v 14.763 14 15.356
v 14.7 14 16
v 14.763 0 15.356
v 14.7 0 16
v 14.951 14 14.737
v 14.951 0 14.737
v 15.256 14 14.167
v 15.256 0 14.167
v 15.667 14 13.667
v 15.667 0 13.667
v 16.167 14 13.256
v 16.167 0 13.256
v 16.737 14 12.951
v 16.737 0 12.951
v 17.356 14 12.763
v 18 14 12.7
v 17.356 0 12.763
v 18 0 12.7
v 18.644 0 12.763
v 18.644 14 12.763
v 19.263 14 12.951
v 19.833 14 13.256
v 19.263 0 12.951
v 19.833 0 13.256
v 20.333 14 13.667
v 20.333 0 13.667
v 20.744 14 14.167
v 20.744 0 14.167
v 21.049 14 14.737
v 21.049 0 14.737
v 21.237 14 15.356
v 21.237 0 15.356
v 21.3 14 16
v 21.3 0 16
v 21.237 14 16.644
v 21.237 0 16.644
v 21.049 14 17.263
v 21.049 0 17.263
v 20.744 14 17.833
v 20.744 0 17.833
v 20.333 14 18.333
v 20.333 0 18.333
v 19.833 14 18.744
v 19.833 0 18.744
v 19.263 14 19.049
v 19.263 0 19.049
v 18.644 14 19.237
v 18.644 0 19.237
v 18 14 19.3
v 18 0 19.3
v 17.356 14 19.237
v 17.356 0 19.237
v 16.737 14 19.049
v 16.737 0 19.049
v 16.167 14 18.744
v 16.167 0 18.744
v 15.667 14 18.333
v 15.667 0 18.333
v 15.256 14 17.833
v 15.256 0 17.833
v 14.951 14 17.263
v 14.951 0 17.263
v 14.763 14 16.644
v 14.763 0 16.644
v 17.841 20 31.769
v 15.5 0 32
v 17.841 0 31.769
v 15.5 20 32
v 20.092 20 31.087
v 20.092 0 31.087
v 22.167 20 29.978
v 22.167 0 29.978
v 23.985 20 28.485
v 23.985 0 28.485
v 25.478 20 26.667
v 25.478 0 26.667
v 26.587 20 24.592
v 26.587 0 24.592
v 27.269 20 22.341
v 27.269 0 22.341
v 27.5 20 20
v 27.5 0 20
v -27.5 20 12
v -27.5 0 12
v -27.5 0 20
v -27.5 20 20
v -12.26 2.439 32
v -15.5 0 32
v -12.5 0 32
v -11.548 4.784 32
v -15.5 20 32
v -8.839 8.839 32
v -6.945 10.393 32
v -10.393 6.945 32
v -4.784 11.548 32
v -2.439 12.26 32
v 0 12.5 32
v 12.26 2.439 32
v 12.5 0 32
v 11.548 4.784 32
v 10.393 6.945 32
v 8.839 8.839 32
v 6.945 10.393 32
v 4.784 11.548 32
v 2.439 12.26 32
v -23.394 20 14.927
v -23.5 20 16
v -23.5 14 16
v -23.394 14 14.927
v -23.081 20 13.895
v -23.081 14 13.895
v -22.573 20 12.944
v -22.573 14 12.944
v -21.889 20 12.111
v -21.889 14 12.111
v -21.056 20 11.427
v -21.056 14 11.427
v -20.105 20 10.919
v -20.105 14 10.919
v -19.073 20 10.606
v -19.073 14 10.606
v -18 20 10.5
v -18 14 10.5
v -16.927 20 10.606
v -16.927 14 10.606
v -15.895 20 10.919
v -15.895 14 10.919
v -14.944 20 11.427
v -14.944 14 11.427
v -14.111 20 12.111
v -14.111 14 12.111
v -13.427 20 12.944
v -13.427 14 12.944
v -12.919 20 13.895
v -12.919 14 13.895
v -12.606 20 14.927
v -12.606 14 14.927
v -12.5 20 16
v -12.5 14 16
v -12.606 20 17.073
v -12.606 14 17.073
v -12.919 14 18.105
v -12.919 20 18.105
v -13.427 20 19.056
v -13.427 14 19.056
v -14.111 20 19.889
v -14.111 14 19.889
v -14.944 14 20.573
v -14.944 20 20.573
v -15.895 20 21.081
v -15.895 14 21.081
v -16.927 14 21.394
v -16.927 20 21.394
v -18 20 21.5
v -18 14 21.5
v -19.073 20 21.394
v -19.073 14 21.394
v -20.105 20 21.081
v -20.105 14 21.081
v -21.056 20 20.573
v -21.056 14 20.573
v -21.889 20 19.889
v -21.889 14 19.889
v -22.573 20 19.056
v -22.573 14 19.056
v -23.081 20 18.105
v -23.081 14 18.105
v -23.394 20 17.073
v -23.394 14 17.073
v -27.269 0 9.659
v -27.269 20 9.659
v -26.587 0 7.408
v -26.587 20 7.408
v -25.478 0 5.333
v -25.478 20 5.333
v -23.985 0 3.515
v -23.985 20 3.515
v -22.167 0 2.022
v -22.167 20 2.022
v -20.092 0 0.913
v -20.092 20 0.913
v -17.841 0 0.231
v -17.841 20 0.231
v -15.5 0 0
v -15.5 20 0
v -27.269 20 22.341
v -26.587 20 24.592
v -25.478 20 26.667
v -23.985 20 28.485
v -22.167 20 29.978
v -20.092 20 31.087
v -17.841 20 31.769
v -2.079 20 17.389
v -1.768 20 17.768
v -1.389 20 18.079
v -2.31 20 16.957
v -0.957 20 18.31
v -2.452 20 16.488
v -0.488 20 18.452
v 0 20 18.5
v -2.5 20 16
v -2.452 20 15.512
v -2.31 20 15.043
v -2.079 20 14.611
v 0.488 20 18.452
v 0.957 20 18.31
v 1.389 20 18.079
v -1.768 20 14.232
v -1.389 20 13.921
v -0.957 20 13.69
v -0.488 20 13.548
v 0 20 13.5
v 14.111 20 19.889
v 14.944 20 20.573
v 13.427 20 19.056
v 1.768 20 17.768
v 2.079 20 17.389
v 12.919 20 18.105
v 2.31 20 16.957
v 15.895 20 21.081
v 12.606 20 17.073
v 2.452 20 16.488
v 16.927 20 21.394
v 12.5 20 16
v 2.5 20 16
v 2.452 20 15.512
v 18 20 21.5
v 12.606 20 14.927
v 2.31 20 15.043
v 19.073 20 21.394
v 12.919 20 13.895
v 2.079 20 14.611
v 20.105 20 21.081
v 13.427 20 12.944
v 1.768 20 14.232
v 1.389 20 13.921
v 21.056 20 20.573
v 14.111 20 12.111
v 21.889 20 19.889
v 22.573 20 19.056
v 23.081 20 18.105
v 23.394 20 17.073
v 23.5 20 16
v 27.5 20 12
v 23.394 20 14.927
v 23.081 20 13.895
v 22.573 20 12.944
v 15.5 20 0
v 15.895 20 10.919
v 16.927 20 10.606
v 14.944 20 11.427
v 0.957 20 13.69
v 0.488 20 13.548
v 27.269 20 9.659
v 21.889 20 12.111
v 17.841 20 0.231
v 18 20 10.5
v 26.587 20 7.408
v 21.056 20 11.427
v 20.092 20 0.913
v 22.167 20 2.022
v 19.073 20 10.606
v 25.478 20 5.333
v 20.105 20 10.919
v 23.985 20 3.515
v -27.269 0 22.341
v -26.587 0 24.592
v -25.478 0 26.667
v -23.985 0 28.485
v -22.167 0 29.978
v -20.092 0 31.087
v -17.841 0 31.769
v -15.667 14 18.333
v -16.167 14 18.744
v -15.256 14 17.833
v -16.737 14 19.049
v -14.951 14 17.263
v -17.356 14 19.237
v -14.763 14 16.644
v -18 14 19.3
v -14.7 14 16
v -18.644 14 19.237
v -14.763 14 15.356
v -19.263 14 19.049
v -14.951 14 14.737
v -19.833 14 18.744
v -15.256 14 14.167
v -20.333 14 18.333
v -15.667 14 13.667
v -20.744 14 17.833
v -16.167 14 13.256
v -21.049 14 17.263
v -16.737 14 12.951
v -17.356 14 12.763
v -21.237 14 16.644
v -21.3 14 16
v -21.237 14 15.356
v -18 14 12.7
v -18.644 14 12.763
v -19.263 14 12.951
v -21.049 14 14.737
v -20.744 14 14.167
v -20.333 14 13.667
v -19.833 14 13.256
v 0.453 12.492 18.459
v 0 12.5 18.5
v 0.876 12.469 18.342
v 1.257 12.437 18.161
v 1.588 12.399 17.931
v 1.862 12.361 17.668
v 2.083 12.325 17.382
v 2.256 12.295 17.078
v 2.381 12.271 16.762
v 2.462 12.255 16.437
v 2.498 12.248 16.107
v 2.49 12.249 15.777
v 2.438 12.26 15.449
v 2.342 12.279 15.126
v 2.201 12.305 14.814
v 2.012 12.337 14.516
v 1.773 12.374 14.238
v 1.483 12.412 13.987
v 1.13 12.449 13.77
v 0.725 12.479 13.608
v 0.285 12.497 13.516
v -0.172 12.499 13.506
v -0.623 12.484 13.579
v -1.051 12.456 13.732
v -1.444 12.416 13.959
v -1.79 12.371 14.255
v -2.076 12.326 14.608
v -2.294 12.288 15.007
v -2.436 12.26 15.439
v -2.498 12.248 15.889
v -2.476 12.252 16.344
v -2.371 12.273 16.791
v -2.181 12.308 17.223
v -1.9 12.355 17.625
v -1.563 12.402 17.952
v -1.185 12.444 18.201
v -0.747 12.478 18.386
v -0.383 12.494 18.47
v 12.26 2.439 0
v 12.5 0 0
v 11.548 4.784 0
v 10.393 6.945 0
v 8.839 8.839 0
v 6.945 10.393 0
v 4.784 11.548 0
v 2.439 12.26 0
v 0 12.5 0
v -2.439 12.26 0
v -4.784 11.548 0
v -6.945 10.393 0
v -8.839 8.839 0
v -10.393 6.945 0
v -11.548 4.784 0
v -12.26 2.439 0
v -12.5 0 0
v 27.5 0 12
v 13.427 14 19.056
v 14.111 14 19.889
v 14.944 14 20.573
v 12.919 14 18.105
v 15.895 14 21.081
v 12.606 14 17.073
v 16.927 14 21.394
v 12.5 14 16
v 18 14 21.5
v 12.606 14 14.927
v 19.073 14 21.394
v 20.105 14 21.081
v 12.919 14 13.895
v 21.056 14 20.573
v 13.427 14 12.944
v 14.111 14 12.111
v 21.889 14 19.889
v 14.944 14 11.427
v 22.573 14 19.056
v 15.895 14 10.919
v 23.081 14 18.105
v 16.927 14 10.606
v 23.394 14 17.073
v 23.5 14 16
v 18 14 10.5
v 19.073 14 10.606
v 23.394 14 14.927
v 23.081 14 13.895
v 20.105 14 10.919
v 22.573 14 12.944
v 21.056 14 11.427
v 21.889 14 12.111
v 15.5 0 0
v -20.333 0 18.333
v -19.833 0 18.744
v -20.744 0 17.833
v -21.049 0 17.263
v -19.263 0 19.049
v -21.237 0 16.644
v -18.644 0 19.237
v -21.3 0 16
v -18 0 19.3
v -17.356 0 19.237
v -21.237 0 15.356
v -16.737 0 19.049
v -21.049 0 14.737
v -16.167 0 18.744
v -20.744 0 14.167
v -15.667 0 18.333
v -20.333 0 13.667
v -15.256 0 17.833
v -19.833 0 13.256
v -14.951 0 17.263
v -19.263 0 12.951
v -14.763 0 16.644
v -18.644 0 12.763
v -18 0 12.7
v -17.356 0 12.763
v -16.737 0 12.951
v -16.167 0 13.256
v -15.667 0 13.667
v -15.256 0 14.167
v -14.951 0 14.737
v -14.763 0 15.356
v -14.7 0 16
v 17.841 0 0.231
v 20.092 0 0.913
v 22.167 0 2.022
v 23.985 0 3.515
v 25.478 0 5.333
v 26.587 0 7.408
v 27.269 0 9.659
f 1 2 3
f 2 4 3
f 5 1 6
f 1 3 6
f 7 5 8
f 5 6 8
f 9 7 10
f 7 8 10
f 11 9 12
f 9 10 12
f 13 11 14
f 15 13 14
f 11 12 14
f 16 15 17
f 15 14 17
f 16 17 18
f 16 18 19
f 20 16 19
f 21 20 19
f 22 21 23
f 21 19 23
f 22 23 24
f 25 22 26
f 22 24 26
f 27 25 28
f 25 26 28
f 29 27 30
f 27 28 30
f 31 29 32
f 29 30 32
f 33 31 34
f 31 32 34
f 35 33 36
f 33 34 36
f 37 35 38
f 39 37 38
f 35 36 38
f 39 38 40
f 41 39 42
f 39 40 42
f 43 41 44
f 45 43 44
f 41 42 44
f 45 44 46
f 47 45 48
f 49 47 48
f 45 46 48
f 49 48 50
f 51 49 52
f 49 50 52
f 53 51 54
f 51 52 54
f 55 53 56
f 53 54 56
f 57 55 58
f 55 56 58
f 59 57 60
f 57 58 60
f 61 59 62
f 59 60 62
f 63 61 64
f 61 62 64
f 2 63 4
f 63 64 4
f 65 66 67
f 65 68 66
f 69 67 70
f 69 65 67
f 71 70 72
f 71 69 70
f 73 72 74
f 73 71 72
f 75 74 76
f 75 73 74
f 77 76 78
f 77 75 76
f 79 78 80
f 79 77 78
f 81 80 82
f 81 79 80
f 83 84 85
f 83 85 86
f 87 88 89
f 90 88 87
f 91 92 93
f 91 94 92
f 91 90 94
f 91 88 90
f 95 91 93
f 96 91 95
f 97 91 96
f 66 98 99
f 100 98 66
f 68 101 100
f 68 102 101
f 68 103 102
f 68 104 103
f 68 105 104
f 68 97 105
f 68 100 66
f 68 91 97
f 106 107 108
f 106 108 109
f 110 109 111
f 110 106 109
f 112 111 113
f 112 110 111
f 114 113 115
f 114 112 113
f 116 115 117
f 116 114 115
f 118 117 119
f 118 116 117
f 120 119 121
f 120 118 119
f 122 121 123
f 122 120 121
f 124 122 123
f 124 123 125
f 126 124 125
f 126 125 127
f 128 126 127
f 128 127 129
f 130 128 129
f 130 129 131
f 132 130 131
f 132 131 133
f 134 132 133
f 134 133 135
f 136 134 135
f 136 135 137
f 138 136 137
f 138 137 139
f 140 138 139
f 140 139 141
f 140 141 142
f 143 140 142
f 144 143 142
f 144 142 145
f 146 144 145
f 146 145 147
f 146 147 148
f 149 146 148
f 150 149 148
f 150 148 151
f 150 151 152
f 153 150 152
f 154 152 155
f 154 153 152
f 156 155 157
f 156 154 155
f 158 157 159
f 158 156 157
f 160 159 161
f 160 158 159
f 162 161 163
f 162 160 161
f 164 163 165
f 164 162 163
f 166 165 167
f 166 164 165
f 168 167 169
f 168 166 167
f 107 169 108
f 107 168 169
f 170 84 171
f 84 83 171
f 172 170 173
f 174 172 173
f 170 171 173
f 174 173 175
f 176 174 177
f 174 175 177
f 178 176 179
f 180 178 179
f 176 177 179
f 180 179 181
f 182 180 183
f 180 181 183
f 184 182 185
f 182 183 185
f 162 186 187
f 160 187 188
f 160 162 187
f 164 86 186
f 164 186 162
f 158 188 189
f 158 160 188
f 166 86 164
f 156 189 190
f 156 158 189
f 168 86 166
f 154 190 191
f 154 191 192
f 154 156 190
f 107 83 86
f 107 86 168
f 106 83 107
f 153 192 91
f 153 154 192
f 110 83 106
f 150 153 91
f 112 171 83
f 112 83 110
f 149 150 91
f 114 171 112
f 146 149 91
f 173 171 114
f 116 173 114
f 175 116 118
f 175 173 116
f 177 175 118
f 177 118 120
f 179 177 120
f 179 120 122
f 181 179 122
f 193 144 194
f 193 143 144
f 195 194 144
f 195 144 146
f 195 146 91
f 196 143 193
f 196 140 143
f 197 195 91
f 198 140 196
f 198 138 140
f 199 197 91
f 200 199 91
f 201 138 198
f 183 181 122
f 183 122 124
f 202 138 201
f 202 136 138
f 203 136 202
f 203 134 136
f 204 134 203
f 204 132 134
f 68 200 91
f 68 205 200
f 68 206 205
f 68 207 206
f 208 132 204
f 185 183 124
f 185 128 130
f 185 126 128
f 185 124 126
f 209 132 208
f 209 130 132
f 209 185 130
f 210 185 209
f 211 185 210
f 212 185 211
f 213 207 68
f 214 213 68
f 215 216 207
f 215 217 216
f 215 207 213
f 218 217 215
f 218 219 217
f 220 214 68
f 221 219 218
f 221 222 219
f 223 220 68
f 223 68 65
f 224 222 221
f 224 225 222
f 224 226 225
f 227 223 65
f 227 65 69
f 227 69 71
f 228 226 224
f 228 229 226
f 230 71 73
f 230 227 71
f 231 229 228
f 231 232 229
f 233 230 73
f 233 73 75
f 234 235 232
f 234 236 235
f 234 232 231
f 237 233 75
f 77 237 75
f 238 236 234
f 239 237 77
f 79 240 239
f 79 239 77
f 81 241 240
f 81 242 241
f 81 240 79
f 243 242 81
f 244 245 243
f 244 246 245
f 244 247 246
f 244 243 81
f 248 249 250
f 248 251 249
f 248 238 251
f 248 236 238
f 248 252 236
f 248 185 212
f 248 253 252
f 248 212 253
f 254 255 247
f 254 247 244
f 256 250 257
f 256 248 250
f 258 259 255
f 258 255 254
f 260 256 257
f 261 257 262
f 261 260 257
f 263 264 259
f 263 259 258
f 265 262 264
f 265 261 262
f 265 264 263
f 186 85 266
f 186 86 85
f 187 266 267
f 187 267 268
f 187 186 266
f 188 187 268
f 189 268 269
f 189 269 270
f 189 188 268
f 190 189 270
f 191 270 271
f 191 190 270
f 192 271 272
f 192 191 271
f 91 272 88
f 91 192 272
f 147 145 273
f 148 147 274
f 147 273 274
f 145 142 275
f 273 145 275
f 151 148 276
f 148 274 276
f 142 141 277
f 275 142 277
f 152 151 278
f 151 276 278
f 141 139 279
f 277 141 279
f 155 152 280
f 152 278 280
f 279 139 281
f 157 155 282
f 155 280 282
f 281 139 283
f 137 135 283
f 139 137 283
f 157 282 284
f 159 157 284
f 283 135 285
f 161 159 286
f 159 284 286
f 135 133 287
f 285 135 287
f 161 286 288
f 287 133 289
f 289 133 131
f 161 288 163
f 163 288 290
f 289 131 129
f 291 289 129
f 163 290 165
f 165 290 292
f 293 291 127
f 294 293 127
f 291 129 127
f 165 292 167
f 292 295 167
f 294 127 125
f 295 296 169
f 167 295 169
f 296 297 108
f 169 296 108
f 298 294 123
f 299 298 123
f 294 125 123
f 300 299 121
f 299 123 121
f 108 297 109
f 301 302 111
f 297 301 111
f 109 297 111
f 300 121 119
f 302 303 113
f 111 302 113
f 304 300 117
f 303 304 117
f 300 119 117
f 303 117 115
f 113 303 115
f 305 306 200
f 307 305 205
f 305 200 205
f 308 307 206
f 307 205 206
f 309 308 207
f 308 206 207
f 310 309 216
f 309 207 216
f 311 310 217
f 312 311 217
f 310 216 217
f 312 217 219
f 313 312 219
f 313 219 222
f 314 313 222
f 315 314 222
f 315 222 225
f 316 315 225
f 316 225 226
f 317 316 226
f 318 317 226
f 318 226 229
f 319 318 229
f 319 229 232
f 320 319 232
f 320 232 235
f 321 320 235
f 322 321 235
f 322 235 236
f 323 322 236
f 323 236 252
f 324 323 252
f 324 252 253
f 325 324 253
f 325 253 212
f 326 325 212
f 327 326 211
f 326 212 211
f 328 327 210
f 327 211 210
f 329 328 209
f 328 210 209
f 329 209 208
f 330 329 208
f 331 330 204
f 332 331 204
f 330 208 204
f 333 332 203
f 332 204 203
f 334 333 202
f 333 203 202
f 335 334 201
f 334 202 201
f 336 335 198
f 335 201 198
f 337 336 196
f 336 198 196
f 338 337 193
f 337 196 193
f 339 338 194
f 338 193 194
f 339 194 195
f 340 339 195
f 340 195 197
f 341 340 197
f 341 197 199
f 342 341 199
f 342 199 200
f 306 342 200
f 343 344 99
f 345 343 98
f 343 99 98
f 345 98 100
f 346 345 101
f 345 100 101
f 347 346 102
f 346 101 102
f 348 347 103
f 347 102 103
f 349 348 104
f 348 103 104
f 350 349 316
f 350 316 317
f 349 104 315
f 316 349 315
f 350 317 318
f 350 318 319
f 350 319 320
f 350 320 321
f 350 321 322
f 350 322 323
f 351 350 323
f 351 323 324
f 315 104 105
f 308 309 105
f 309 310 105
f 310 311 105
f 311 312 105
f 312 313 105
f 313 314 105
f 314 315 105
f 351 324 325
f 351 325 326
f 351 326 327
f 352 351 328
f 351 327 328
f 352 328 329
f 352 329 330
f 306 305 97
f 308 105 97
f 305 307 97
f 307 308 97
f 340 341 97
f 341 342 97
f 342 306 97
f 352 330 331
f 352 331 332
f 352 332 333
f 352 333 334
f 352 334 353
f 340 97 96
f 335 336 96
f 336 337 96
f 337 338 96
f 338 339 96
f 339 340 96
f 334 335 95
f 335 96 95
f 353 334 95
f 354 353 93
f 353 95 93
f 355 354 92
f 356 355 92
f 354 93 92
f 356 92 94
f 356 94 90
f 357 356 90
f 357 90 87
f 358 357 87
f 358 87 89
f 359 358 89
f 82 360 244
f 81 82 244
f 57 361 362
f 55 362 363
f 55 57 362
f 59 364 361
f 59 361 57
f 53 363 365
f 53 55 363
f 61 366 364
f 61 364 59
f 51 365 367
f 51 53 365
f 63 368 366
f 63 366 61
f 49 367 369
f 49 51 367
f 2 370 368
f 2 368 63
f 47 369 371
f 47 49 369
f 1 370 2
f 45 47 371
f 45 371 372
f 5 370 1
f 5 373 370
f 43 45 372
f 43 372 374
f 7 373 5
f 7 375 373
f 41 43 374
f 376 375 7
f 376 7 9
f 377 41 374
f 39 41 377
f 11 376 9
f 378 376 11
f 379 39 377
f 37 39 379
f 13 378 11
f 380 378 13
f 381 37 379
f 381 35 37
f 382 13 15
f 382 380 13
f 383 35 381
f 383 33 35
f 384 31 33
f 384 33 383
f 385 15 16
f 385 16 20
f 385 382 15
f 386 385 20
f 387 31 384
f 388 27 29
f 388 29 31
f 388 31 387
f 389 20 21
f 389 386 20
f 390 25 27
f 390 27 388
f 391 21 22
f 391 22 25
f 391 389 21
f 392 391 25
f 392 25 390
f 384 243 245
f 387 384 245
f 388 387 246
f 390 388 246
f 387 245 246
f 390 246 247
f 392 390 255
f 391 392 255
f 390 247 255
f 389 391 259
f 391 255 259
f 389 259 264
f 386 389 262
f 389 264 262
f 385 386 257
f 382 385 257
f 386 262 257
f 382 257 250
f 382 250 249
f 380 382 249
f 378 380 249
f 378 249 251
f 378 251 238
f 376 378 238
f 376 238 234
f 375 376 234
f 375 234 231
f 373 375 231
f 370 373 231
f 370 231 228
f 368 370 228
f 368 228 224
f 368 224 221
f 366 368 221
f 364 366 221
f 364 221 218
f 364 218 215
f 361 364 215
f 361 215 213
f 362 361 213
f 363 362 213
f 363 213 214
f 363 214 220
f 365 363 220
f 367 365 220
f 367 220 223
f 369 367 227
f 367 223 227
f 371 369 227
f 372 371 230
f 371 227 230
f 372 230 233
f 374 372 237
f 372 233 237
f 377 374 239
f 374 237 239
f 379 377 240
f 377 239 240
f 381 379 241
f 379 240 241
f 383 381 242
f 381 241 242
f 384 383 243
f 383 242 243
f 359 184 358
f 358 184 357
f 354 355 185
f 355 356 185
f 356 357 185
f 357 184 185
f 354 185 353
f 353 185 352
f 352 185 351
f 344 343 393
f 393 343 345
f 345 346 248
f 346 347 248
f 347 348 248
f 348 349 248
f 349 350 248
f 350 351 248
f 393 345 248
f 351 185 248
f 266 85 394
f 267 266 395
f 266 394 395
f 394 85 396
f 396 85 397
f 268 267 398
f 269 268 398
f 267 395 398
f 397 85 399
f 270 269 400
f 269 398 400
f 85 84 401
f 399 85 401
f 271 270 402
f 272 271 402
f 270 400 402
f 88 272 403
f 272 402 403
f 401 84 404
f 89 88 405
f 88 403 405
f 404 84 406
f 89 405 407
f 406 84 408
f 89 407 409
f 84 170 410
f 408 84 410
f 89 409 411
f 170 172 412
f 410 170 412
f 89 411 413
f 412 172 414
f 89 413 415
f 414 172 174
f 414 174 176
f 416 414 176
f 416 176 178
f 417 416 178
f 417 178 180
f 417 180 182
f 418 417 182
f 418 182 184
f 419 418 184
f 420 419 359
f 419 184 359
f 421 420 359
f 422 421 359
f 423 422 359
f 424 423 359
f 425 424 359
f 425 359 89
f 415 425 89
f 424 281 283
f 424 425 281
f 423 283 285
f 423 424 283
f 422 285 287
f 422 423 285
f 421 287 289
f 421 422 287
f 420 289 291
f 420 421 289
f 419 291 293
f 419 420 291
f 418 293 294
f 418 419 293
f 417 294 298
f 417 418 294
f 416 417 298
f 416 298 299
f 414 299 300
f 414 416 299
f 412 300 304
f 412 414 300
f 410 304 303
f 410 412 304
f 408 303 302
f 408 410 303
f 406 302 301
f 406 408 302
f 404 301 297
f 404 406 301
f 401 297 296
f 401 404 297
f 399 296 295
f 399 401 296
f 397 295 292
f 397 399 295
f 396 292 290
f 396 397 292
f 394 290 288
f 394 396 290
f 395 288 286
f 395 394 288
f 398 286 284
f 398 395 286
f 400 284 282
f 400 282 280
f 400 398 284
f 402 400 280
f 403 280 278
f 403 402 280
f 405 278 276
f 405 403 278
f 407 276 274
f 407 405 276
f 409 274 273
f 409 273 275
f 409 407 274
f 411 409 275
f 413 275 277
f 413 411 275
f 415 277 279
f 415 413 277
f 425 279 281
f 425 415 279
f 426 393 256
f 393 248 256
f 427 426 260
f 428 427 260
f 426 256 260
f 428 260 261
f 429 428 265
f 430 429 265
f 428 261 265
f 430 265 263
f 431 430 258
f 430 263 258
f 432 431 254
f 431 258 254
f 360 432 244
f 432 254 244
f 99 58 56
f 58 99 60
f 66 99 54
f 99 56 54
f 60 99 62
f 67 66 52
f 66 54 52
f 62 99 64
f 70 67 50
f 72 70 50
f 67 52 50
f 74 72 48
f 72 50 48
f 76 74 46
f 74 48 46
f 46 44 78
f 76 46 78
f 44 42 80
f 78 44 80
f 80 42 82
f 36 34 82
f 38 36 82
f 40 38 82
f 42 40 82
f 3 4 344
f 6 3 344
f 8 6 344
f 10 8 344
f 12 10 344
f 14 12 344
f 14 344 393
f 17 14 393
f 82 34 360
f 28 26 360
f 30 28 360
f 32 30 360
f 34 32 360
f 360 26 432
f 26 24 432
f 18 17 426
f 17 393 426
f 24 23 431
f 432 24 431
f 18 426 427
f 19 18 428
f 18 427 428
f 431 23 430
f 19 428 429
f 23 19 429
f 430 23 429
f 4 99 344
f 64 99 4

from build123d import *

# Parameters (mm, degrees)
SKETCH1_W                      = 55
SKETCH1_H                      = 20
BOSS_EXTRUDE1_DEPTH            = 32
SKETCH2_R                      = 12.5
CUT_EXTRUDE1_DEPTH             = 33
FILLET1_R                      = 12
CBORE_FOR_M6_SHCS4_D           = 6.6
CBORE_FOR_M6_SHCS4_CBORE_D     = 11
CBORE_FOR_M6_SHCS4_CBORE_DEPTH = 6
SKETCH18_R                     = 2.5
CUT_EXTRUDE2_DEPTH             = 21


with BuildPart() as part:
    # Sketch1 → Boss-Extrude1 (new body)
    with BuildSketch(Plane.XY):
        with Locations((0, 10)):
            Rectangle(SKETCH1_W, SKETCH1_H)
    extrude(amount=BOSS_EXTRUDE1_DEPTH)

    # Sketch2 → Cut-Extrude1 (cut, through all)
    with BuildSketch(Plane.XY.offset(32)):
        Circle(SKETCH2_R)
    extrude(amount=-CUT_EXTRUDE1_DEPTH, mode=Mode.SUBTRACT)

    # Fillet1
    fillet1_edges = [part.edges().sort_by_distance(p)[0] for p in [
        (27.5, 10, 32),
        (-27.5, 10, 32),
        (27.5, 10, 0),
        (-27.5, 10, 0),
    ]]
    fillet(fillet1_edges, radius=FILLET1_R)

    # CBORE for M6 SHCS4 (through all)
    with Locations(Plane(origin=(0, 20, 0), x_dir=(1, 0, 0), z_dir=(0, 1, 0))):
        with Locations((18, -16)):
            cbore_for_m6_shcs4 = CounterBoreHole(CBORE_FOR_M6_SHCS4_D / 2, CBORE_FOR_M6_SHCS4_CBORE_D / 2, CBORE_FOR_M6_SHCS4_CBORE_DEPTH)

    # Mirror2: CBORE for M6 SHCS4 across plane
    add(cbore_for_m6_shcs4.mirror(Plane(origin=(0, 0, 0), x_dir=(0, 0, 1), z_dir=(1, 0, 0))), mode=Mode.SUBTRACT)

    # Sketch18 → Cut-Extrude2 (cut, through all)
    with BuildSketch(Plane(origin=(0, 20, 0), x_dir=(1, 0, 0), z_dir=(0, 1, 0))):
        with Locations(Location((0, -16, 0), (0, 0, 270))):  # turned: the seam where the file's is
            Circle(SKETCH18_R)
    extrude(amount=-CUT_EXTRUDE2_DEPTH, mode=Mode.SUBTRACT)


solid = part.part
